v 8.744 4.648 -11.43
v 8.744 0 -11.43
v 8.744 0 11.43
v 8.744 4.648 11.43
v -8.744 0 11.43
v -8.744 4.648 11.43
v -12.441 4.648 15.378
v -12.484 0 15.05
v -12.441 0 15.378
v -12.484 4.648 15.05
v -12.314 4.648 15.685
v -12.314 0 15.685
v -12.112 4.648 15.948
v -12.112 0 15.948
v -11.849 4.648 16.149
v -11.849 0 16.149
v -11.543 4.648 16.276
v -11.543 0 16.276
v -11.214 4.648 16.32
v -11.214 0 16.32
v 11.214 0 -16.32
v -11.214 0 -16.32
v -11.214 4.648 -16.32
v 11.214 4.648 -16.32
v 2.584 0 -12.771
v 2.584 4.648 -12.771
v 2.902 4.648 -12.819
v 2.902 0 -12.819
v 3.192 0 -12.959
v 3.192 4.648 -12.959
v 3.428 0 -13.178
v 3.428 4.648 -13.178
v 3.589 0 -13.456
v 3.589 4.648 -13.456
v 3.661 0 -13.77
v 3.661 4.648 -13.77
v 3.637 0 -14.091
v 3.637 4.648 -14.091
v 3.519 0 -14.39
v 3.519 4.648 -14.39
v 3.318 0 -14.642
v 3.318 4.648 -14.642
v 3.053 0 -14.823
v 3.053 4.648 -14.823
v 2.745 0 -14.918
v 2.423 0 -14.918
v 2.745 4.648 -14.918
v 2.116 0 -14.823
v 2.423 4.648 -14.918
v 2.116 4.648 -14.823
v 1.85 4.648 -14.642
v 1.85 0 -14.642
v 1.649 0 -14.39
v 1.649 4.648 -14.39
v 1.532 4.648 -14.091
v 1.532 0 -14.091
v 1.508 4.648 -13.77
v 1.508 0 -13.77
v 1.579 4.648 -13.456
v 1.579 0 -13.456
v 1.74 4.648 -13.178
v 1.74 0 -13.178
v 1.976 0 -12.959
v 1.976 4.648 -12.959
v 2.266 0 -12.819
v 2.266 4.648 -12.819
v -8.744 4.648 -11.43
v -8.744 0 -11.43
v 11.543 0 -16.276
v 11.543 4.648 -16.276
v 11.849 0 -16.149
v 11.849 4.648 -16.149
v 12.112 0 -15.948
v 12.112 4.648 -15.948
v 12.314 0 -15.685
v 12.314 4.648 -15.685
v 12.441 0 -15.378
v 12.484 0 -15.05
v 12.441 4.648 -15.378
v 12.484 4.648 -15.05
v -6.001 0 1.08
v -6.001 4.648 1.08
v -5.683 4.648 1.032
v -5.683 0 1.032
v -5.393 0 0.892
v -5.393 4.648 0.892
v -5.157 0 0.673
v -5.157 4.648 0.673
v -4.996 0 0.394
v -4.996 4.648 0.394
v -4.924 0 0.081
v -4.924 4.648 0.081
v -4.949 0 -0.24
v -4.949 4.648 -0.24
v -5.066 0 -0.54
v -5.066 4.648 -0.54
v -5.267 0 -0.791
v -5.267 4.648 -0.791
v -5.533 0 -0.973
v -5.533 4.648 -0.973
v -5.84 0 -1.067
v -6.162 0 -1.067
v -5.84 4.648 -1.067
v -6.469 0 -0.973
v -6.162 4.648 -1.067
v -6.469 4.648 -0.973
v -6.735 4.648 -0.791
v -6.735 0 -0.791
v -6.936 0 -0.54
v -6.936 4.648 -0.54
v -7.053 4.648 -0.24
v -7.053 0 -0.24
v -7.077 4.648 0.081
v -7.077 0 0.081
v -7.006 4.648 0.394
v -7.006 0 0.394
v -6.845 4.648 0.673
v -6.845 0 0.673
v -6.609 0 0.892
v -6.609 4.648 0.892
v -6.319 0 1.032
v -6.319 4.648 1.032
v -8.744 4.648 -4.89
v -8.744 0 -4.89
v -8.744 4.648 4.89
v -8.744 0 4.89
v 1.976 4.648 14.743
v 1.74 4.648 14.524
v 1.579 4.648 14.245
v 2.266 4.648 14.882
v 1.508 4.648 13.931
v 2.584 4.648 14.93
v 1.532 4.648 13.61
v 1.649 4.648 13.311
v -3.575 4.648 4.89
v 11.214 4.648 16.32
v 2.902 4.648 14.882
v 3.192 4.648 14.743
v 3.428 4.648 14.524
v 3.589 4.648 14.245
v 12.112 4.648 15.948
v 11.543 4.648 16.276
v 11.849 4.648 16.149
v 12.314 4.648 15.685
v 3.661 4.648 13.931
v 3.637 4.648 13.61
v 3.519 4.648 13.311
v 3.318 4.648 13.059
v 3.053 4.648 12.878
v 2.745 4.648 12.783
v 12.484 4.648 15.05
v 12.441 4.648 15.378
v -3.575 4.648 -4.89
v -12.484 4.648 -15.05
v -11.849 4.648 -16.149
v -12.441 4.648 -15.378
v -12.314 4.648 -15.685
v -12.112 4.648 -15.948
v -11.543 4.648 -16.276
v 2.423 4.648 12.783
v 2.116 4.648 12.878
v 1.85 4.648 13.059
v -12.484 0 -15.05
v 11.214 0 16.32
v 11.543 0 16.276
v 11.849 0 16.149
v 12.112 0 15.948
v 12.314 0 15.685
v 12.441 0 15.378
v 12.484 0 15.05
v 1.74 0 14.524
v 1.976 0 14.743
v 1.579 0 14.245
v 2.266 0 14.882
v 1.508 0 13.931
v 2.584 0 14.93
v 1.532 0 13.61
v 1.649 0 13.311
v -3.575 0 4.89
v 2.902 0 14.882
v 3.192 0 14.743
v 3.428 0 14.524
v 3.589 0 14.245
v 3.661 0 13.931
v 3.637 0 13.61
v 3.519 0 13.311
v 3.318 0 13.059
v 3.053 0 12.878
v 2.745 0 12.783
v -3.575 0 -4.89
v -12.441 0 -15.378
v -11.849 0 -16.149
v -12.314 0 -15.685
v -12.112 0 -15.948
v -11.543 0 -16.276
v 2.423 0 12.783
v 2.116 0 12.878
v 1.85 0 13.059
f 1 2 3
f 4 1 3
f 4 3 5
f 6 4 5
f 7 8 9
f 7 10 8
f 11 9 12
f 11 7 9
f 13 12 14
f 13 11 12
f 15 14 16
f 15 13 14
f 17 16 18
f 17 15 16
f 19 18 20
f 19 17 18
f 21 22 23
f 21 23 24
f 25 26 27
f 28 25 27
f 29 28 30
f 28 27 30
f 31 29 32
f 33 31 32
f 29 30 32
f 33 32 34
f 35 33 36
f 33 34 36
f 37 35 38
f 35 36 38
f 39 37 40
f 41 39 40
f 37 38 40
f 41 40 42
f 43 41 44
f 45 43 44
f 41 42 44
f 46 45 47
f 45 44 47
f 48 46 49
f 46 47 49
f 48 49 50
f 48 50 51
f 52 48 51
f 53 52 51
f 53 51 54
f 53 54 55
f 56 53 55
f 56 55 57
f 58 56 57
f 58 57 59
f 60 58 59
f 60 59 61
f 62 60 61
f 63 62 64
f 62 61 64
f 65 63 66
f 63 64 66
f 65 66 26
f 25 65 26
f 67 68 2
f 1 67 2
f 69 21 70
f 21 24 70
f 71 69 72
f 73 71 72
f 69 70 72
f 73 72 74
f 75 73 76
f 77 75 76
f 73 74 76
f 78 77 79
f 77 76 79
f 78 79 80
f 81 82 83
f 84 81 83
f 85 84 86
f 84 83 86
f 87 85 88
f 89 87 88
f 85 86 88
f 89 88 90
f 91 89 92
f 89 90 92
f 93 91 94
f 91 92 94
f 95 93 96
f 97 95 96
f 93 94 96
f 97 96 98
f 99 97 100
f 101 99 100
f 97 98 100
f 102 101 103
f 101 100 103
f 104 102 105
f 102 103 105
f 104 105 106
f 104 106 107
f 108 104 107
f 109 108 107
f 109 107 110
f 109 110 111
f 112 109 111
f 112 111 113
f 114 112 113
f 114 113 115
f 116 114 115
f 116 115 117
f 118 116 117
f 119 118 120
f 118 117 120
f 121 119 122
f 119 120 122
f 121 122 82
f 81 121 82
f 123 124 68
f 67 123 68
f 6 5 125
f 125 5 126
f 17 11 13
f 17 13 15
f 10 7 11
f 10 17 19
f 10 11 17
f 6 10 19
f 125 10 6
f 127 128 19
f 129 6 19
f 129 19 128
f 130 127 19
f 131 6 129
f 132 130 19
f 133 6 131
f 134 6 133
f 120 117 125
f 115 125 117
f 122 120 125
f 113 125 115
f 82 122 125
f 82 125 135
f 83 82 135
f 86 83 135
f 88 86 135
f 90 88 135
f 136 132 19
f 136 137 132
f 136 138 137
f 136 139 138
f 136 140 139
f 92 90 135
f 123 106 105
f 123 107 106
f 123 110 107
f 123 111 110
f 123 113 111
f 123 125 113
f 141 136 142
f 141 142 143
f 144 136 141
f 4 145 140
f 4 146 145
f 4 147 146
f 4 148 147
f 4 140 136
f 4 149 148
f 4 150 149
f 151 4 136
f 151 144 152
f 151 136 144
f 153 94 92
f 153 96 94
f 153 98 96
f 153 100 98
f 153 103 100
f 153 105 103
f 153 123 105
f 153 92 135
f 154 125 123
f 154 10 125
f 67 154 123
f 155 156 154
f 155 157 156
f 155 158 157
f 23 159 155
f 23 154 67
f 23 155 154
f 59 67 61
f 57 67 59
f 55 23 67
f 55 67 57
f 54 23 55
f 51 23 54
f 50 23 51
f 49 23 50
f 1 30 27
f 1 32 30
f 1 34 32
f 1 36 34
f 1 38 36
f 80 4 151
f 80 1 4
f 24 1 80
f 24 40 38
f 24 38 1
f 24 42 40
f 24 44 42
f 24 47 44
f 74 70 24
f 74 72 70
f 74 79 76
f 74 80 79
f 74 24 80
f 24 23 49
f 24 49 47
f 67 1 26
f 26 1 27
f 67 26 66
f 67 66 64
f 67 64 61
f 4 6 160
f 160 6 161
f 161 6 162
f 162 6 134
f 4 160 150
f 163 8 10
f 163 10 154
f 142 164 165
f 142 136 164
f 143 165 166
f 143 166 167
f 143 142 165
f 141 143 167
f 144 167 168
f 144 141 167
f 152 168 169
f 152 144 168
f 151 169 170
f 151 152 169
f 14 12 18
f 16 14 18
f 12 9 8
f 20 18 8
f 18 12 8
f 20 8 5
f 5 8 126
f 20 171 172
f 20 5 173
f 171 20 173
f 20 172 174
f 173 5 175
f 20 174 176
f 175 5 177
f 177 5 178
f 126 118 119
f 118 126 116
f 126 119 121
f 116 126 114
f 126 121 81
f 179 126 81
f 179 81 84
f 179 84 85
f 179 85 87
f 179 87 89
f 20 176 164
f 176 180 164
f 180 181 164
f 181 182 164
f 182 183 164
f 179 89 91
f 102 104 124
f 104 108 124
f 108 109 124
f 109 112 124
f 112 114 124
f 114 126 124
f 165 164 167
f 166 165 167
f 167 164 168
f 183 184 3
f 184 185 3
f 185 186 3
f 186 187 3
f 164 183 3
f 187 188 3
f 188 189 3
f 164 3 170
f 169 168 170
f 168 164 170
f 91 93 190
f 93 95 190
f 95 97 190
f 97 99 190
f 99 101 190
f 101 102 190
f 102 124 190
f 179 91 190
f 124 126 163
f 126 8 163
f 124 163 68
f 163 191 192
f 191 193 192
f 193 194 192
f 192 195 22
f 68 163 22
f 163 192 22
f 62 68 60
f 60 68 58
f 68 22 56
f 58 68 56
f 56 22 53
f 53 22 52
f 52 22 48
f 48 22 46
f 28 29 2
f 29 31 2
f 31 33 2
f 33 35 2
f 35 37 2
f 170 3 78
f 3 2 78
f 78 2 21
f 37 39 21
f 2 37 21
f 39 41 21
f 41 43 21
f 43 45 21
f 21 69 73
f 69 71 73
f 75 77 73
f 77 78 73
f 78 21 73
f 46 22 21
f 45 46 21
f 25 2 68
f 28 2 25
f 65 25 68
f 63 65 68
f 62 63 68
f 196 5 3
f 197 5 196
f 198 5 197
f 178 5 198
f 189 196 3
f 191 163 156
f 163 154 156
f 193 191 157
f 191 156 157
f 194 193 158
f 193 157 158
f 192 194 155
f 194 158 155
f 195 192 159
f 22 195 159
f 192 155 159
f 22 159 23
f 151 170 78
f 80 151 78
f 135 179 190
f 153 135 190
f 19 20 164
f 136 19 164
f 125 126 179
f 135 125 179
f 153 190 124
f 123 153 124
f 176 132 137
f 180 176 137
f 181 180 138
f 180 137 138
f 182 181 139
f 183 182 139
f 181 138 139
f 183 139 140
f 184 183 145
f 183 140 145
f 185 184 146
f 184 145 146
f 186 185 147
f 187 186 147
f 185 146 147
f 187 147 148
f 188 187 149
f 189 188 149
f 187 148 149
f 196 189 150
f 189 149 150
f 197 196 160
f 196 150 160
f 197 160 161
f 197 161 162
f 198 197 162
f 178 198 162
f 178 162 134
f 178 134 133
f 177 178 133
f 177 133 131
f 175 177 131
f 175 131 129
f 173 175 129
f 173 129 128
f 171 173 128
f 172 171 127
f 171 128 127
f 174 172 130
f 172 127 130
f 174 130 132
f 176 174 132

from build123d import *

# Parameters (mm, degrees)
SKETCH1_W           = 24.9682
SKETCH1_H           = 32.639
BOSS_EXTRUDE1_DEPTH = 4.6482
SKETCH2_R           = 1.0795
CUT_EXTRUDE1_DEPTH  = 4.6482
FILLET1_R           = 1.27


with BuildPart() as part:
    # Sketch1 → Boss-Extrude1 (new body)
    with BuildSketch(Plane(origin=(0, 0, 0), x_dir=(1, 0, 0), z_dir=(0, 1, 0))):
        Rectangle(SKETCH1_W, SKETCH1_H)
        Polygon((8.743727626, 11.43), (8.743727626, -11.43), (-8.743727626, -11.43), (-8.743727626, -4.8895), (-3.575272374, -4.8895), (-3.575272374, 4.8895), (-8.743727626, 4.8895), (-8.743727626, 11.43), align=None, mode=Mode.SUBTRACT)
    extrude(amount=BOSS_EXTRUDE1_DEPTH)

    # Sketch2 → Cut-Extrude1 (cut)
    with BuildSketch(Plane(origin=(0, 4.6482, 0), x_dir=(1, 0, 0), z_dir=(0, 1, 0))):
        with Locations(Location((2.584227626, 13.85062, 0), (0, 0, 270))):
            Circle(SKETCH2_R)
        with Locations(Location((2.584227626, -13.85062, 0), (0, 0, 270))):
            Circle(SKETCH2_R)
        with Locations(Location((-6.000972374, 0, 0), (0, 0, 270))):
            Circle(SKETCH2_R)
    extrude(amount=-CUT_EXTRUDE1_DEPTH, mode=Mode.SUBTRACT)

    # Fillet1
    fillet1_edges = [part.edges().sort_by_distance(p)[0] for p in [
        (-12.4841, 2.3241, 16.3195),
        (12.4841, 2.3241, 16.3195),
        (12.4841, 2.3241, -16.3195),
        (-12.4841, 2.3241, -16.3195),
    ]]
    fillet(fillet1_edges, radius=FILLET1_R)


solid = part.part
